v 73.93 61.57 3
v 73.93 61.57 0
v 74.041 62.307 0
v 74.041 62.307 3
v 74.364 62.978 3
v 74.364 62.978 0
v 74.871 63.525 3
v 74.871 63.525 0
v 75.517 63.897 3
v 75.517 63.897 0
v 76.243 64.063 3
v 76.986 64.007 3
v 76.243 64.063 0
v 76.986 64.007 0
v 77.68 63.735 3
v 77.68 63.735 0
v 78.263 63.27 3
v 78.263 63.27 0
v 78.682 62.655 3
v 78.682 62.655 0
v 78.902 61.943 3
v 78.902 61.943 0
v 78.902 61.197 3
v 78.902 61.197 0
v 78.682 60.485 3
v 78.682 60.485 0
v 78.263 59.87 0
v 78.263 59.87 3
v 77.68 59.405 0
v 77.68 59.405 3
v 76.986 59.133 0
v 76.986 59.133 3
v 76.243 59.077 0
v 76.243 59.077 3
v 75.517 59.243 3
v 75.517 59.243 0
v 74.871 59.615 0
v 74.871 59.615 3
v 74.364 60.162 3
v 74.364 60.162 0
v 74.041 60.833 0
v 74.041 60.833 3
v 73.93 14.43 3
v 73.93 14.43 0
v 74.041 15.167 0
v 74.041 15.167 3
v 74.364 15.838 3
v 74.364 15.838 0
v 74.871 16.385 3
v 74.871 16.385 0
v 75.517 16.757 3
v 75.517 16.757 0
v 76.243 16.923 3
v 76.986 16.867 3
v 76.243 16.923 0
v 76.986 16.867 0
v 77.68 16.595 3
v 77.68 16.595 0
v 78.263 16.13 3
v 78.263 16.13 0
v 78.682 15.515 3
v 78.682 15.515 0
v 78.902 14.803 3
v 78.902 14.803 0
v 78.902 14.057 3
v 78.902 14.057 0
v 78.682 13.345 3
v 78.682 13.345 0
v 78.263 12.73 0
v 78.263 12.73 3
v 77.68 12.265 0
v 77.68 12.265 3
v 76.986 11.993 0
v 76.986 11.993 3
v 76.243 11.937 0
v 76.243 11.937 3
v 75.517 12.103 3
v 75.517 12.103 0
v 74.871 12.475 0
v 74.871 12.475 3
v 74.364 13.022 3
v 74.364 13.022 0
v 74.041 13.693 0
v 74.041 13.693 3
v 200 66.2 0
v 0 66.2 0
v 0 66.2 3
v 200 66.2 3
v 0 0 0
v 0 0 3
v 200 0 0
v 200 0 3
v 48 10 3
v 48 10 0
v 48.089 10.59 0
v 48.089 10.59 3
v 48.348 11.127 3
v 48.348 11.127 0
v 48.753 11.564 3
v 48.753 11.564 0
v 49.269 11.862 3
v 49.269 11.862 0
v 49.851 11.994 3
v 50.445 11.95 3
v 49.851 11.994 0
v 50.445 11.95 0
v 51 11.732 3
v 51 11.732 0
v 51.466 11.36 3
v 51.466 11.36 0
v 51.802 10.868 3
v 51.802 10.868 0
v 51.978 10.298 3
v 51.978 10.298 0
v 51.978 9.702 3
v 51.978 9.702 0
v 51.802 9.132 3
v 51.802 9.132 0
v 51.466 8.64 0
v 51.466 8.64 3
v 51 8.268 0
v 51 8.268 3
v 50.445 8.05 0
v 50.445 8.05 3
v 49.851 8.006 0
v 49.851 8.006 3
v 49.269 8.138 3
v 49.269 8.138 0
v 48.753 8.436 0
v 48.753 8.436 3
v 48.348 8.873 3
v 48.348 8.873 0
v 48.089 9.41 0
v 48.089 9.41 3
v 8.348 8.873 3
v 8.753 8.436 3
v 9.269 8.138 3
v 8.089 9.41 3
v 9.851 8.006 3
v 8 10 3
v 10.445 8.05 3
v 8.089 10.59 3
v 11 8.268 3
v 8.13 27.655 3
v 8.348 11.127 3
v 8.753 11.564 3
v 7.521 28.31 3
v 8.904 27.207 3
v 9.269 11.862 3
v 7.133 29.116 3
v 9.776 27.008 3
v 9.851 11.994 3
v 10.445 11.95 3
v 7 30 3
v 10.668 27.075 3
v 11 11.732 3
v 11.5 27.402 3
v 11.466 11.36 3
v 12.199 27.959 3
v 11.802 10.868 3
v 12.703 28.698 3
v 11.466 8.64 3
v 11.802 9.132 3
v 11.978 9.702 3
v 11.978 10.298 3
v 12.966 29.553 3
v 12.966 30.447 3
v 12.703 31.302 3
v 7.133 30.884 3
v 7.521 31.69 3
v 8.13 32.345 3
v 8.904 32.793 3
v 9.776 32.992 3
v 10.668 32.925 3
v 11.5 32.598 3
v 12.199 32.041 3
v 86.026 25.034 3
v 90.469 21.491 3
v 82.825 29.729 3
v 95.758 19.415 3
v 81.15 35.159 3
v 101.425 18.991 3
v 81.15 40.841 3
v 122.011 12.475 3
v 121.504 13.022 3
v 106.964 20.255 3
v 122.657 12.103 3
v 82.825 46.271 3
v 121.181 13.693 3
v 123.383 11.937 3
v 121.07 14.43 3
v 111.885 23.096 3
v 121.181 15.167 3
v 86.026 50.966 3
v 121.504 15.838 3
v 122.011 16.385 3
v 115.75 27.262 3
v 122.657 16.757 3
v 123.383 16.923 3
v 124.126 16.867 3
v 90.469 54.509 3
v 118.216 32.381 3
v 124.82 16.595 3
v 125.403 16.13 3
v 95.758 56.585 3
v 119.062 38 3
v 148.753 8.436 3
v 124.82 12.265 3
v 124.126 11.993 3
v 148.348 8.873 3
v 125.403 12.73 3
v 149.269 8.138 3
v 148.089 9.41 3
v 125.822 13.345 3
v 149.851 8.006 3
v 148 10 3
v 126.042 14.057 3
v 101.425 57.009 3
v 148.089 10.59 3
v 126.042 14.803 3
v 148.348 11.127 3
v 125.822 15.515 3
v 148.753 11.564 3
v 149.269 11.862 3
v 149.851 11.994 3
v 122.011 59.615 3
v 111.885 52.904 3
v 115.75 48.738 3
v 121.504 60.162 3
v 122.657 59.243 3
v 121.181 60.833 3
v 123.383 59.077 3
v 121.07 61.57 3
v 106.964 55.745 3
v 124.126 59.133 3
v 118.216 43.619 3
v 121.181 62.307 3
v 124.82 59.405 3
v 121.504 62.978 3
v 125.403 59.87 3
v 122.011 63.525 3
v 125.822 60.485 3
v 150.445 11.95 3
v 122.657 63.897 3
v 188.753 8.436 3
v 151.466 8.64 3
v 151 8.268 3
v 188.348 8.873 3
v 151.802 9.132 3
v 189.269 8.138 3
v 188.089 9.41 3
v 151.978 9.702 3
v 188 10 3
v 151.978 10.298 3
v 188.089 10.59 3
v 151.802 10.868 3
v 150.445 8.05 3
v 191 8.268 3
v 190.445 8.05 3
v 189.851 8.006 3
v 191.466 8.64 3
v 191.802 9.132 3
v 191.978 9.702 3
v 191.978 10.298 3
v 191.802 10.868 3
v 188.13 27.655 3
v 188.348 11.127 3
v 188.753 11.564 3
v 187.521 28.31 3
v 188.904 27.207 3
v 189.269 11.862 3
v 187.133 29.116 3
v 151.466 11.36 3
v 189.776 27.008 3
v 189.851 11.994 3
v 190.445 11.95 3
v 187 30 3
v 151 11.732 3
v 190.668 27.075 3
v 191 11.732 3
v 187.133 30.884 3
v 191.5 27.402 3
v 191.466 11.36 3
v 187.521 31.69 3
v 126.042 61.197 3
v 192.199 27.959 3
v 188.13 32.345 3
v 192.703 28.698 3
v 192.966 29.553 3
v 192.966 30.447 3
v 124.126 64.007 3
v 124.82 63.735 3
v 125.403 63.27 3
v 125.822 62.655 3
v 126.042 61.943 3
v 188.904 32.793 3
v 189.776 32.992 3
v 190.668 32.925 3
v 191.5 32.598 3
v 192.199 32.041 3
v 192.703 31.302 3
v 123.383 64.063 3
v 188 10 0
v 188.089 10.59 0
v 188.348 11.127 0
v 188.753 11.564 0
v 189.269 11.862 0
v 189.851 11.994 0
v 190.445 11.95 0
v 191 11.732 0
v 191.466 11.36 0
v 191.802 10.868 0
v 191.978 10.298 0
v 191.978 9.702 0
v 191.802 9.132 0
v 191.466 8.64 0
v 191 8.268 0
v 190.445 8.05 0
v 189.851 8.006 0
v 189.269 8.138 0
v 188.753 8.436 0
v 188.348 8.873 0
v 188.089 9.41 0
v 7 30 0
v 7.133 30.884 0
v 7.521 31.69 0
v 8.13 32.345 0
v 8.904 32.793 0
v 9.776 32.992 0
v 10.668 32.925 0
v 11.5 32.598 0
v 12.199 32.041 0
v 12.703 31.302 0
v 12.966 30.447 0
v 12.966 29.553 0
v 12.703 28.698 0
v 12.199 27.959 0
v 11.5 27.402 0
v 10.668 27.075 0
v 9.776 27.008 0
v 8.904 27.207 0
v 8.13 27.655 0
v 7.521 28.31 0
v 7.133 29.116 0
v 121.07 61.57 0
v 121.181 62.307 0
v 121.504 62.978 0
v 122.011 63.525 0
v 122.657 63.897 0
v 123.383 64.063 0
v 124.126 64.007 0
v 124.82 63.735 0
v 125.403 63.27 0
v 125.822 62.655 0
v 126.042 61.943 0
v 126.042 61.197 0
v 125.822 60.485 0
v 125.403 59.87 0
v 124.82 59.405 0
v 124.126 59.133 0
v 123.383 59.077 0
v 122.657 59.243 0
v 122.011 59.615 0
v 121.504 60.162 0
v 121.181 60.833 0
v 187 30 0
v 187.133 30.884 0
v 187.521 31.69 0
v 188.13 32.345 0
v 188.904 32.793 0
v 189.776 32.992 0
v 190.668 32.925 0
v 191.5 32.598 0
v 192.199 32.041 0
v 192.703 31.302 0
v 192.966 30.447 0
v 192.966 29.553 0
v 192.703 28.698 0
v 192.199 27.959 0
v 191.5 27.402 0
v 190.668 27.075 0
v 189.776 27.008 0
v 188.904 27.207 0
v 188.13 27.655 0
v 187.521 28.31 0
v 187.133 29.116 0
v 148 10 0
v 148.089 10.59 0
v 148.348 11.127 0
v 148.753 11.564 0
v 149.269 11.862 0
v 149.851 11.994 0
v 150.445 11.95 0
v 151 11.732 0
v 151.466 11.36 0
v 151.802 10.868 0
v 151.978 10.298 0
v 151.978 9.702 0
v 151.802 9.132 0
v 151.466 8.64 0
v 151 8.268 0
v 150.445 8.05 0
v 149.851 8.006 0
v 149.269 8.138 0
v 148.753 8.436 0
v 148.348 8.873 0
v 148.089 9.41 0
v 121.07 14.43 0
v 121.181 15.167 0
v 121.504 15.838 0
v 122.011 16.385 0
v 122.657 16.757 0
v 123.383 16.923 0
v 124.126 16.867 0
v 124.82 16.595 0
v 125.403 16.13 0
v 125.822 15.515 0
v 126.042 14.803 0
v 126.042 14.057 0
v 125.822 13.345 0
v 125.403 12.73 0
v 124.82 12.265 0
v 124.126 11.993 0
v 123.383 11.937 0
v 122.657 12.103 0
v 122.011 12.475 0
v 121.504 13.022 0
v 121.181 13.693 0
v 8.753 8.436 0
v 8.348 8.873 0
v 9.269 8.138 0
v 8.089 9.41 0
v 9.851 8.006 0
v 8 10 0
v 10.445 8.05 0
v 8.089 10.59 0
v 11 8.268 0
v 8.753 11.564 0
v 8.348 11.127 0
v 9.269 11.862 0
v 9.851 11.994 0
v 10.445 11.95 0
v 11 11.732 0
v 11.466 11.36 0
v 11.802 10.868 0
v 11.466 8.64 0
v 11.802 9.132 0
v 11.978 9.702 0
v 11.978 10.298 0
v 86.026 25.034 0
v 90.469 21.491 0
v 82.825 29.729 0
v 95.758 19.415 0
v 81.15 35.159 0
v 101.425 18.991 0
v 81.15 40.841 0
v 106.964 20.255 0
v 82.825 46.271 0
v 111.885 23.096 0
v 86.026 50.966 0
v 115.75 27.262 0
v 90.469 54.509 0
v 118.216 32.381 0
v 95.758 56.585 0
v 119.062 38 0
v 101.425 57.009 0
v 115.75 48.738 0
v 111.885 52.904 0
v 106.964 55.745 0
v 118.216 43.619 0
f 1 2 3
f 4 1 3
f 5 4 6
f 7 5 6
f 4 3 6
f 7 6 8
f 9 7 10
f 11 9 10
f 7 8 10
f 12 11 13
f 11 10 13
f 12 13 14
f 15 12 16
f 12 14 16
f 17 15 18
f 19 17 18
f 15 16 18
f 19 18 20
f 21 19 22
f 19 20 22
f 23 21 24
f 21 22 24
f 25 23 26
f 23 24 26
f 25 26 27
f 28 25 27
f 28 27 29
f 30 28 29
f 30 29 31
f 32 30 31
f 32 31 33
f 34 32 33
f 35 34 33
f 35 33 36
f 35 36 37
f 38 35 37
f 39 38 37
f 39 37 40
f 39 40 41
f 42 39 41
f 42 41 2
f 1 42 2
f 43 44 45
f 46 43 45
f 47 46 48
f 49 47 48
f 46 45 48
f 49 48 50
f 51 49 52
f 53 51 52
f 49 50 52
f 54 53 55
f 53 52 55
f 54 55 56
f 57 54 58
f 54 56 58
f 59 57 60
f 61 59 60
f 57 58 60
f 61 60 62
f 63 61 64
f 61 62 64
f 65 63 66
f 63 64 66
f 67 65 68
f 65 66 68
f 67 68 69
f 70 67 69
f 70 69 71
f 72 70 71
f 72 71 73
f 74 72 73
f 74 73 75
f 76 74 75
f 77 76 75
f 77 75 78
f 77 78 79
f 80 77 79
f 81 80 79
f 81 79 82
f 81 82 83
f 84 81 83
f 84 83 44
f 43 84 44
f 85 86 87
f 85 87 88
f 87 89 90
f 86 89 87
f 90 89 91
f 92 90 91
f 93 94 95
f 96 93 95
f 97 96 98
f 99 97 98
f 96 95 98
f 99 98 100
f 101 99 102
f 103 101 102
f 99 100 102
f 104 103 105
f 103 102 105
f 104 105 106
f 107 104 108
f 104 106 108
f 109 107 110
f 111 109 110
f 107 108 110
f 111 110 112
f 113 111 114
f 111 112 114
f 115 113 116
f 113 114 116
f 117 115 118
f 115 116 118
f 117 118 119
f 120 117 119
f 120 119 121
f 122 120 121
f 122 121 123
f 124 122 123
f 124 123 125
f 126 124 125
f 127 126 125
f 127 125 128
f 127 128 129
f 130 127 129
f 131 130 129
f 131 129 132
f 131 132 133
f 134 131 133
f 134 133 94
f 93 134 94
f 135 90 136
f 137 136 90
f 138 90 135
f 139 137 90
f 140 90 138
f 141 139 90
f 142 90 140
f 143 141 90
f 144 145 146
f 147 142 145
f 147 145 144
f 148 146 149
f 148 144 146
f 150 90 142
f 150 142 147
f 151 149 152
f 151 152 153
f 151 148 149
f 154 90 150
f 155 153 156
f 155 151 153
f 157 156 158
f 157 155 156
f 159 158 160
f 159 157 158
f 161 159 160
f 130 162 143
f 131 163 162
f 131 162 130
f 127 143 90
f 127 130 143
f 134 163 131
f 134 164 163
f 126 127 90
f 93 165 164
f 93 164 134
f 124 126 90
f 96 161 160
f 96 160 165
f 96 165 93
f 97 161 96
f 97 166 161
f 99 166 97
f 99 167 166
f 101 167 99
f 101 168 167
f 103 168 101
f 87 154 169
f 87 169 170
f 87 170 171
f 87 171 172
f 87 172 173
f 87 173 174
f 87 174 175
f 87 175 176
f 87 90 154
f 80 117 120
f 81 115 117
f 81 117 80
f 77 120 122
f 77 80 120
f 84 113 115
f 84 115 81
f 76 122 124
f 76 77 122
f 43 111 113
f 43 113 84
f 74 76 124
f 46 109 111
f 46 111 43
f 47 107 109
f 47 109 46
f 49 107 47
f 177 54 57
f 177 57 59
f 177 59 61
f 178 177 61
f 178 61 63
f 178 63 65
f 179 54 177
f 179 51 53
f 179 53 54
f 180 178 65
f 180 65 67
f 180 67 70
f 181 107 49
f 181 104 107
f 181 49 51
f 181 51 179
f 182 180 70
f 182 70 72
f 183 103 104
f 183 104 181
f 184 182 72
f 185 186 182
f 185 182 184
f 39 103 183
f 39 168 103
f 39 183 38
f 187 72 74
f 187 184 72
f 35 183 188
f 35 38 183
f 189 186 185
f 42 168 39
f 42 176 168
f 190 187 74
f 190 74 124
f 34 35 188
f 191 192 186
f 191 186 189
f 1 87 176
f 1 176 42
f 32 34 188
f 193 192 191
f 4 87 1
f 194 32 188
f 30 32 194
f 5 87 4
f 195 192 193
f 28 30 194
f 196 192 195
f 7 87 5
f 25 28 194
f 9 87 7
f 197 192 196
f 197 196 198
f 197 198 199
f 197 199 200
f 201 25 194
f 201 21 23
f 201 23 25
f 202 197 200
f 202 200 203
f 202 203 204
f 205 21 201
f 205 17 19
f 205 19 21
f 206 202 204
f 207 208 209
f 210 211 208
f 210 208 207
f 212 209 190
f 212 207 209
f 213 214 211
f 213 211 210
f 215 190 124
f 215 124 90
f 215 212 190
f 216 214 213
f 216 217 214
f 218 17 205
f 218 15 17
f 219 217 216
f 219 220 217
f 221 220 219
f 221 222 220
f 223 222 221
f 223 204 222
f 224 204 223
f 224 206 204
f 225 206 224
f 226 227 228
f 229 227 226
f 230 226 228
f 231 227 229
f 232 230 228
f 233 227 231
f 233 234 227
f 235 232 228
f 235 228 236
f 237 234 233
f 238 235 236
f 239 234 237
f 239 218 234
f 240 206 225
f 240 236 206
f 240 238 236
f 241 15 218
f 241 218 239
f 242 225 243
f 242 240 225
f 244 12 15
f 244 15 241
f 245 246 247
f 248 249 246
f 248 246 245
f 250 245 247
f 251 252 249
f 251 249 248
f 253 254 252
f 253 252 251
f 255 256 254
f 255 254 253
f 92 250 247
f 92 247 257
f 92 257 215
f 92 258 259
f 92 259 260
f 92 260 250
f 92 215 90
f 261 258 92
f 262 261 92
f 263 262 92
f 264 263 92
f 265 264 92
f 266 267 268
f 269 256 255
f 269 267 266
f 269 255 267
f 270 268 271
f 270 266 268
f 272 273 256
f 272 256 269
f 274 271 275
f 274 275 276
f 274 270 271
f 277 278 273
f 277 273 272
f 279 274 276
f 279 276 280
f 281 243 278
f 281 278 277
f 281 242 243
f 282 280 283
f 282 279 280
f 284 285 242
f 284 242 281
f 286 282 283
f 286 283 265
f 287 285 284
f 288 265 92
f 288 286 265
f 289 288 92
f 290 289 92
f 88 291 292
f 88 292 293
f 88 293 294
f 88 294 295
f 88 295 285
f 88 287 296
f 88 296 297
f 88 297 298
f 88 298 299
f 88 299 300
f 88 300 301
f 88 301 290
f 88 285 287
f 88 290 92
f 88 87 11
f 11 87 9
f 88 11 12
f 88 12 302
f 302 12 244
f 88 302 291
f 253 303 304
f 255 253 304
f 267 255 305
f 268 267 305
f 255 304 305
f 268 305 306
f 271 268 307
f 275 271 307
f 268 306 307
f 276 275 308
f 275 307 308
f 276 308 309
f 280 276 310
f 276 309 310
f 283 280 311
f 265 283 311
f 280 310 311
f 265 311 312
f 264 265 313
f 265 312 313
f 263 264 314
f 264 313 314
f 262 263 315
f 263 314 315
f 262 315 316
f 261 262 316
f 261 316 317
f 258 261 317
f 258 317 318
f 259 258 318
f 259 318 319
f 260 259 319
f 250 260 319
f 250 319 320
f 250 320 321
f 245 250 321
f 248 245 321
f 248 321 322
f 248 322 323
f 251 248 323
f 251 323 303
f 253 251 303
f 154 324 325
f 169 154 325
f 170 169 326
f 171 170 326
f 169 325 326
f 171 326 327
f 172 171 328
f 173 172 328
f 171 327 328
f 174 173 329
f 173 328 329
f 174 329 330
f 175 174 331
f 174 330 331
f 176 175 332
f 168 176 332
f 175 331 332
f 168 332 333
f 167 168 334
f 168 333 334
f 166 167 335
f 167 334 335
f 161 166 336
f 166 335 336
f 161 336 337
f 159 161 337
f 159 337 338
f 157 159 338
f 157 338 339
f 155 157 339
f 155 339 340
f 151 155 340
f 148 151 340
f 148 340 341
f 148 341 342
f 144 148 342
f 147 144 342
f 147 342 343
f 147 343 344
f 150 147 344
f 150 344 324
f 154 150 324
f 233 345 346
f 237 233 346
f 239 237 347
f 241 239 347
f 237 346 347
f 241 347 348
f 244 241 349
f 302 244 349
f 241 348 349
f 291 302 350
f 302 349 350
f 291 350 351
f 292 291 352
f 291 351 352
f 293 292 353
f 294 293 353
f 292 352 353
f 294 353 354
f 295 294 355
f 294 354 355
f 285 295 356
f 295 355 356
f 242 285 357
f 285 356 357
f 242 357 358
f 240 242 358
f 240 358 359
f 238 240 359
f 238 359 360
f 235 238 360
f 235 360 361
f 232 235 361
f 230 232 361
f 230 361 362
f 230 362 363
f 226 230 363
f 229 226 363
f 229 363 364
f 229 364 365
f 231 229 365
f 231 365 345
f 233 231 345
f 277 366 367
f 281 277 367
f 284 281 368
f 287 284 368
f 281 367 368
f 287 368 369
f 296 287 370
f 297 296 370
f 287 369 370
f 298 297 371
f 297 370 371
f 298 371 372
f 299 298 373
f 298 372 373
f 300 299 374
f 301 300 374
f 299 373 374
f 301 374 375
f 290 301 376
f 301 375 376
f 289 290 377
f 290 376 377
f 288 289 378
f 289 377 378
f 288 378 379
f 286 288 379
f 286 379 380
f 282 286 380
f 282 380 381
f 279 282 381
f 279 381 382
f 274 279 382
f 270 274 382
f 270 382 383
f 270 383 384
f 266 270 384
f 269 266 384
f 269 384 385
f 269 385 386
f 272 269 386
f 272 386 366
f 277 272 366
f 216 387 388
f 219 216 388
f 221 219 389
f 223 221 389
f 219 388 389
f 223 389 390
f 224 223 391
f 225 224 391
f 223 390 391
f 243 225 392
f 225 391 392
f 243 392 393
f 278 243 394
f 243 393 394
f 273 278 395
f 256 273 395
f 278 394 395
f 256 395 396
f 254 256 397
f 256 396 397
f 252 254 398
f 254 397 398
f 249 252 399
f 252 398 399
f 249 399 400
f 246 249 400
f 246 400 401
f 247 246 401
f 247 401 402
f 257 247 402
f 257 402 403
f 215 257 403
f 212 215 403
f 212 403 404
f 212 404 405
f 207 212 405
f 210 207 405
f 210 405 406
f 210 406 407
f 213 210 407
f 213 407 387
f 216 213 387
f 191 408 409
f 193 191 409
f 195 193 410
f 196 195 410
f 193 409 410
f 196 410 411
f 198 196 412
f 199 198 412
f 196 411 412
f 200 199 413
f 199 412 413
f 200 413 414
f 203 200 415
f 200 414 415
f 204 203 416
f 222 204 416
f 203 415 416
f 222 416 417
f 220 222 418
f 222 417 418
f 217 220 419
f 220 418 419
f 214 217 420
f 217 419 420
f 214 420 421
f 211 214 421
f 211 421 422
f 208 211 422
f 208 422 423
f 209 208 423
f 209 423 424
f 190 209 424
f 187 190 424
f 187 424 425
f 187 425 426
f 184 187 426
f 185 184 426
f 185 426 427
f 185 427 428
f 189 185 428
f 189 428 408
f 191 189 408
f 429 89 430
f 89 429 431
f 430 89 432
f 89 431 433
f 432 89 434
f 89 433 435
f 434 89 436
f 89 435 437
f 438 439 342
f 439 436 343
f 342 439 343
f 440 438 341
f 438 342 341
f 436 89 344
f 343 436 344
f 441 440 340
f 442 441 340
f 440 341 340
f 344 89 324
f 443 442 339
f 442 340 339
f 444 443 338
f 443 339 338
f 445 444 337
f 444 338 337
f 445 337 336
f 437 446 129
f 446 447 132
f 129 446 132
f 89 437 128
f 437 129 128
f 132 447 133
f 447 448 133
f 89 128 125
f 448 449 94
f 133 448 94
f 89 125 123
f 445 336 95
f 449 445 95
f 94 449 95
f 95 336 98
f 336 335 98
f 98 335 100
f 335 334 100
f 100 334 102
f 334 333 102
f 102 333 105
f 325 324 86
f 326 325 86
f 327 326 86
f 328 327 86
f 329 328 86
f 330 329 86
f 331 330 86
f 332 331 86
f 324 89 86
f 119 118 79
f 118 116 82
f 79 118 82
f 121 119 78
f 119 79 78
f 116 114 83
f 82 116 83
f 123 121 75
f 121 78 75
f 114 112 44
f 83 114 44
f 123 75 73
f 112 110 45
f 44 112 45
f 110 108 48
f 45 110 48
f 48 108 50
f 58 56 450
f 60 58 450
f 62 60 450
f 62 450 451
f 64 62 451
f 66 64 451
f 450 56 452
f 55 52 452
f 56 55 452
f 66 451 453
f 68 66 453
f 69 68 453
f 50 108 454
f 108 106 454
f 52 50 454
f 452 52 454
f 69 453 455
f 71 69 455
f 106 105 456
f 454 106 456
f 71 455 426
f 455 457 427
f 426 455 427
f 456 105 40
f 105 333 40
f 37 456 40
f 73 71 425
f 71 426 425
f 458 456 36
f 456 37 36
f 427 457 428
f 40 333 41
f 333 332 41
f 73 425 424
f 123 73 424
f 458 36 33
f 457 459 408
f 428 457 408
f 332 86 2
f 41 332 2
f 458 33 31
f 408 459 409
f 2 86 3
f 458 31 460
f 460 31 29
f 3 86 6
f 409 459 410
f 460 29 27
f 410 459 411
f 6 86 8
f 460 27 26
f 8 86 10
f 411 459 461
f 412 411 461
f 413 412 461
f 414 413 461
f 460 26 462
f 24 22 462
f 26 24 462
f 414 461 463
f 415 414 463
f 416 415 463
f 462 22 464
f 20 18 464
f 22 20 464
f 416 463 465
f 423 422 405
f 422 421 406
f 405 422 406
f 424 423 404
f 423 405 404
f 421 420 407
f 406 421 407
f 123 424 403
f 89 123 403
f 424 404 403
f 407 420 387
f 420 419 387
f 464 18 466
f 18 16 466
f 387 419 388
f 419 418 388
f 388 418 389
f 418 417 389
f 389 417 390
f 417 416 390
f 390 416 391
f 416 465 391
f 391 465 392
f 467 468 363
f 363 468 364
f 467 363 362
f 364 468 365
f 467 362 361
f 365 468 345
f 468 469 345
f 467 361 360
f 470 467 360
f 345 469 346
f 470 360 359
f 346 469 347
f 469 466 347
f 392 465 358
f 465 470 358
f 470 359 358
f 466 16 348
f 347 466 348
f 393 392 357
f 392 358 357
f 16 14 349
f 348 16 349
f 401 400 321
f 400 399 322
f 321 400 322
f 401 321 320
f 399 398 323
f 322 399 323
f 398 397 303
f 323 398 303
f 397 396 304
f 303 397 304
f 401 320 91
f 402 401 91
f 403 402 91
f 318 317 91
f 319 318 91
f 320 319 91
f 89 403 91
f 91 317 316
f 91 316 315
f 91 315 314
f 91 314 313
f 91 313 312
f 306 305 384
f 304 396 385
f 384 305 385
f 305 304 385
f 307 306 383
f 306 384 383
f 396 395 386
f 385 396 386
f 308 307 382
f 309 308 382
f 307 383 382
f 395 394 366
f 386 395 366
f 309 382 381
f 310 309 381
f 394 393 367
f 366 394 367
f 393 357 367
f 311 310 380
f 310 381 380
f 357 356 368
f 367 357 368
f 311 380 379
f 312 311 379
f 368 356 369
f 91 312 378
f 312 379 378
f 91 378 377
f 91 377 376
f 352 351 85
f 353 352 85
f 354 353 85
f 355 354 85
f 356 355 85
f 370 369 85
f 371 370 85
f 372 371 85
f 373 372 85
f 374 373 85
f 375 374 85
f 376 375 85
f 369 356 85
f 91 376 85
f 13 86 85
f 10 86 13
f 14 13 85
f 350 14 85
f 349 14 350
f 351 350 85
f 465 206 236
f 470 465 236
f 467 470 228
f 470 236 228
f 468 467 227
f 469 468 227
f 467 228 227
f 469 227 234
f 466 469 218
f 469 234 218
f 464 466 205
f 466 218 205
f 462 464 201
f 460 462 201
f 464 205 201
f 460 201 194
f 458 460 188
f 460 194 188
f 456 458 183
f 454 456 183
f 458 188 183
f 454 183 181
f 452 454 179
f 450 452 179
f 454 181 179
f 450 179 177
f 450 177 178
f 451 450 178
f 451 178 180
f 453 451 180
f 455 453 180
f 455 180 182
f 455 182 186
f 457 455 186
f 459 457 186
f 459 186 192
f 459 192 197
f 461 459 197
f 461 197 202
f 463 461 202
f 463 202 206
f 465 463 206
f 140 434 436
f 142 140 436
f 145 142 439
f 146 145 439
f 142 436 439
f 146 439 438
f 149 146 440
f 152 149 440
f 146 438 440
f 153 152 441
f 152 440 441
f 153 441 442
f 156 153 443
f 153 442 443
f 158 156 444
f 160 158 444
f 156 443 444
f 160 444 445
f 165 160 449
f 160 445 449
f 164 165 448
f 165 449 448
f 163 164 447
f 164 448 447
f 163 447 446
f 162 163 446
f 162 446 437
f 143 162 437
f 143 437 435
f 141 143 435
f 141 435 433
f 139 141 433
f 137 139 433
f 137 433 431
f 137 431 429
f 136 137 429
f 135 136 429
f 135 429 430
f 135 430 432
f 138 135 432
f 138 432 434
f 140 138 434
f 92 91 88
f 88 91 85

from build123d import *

# Parameters (mm, degrees)
SKIZZE1_W                       = 200
SKIZZE1_H                       = 66.2
AUFSATZ_LINEAR_AUSTRAGEN1_DEPTH = 3
SKIZZE2_R                       = 19.0625
SCHNITT_LINEAR_AUSTRAGEN1_DEPTH = 24
SKIZZE3_R                       = 2
SCHNITT_LINEAR_AUSTRAGEN2_DEPTH = 10
SKIZZE4_R                       = 3
SCHNITT_LINEAR_AUSTRAGEN3_DEPTH = 10
SKIZZE5_R                       = 2.5
SCHNITT_LINEAR_AUSTRAGEN4_DEPTH = 10


with BuildPart() as part:
    # Skizze1 → Aufsatz-Linear austragen1 (new body)
    with BuildSketch(Plane.XY):
        with Locations((100, 33.1)):
            Rectangle(SKIZZE1_W, SKIZZE1_H)
    extrude(amount=AUFSATZ_LINEAR_AUSTRAGEN1_DEPTH)

    # Skizze2 → Schnitt-Linear austragen1 (cut)
    with BuildSketch(Plane.XY.offset(3)):
        with Locations((100, 38)):
            Circle(SKIZZE2_R)
    extrude(amount=-SCHNITT_LINEAR_AUSTRAGEN1_DEPTH, mode=Mode.SUBTRACT)

    # Skizze3 → Schnitt-Linear austragen2 (cut)
    with BuildSketch(Plane(origin=(0, 0, 0), x_dir=(-1, 0, 0), z_dir=(0, 0, -1))):
        with Locations((-190, 10)):
            Circle(SKIZZE3_R)
        with Locations((-150, 10)):
            Circle(SKIZZE3_R)
        with Locations((-50, 10)):
            Circle(SKIZZE3_R)
        with Locations((-10, 10)):
            Circle(SKIZZE3_R)
    extrude(amount=-SCHNITT_LINEAR_AUSTRAGEN2_DEPTH, mode=Mode.SUBTRACT)

    # Skizze4 → Schnitt-Linear austragen3 (cut)
    with BuildSketch(Plane(origin=(0, 0, 0), x_dir=(-1, 0, 0), z_dir=(0, 0, -1))):
        with Locations((-190, 30)):
            Circle(SKIZZE4_R)
        with Locations((-10, 30)):
            Circle(SKIZZE4_R)
    extrude(amount=-SCHNITT_LINEAR_AUSTRAGEN3_DEPTH, mode=Mode.SUBTRACT)

    # Skizze5 → Schnitt-Linear austragen4 (cut)
    with BuildSketch(Plane(origin=(0, 0, 0), x_dir=(-1, 0, 0), z_dir=(0, 0, -1))):
        with Locations((-76.43, 61.57)):
            Circle(SKIZZE5_R)
        with Locations((-123.57, 61.57)):
            Circle(SKIZZE5_R)
        with Locations((-123.57, 14.43)):
            Circle(SKIZZE5_R)
        with Locations((-76.43, 14.43)):
            Circle(SKIZZE5_R)
    extrude(amount=-SCHNITT_LINEAR_AUSTRAGEN4_DEPTH, mode=Mode.SUBTRACT)


solid = part.part
